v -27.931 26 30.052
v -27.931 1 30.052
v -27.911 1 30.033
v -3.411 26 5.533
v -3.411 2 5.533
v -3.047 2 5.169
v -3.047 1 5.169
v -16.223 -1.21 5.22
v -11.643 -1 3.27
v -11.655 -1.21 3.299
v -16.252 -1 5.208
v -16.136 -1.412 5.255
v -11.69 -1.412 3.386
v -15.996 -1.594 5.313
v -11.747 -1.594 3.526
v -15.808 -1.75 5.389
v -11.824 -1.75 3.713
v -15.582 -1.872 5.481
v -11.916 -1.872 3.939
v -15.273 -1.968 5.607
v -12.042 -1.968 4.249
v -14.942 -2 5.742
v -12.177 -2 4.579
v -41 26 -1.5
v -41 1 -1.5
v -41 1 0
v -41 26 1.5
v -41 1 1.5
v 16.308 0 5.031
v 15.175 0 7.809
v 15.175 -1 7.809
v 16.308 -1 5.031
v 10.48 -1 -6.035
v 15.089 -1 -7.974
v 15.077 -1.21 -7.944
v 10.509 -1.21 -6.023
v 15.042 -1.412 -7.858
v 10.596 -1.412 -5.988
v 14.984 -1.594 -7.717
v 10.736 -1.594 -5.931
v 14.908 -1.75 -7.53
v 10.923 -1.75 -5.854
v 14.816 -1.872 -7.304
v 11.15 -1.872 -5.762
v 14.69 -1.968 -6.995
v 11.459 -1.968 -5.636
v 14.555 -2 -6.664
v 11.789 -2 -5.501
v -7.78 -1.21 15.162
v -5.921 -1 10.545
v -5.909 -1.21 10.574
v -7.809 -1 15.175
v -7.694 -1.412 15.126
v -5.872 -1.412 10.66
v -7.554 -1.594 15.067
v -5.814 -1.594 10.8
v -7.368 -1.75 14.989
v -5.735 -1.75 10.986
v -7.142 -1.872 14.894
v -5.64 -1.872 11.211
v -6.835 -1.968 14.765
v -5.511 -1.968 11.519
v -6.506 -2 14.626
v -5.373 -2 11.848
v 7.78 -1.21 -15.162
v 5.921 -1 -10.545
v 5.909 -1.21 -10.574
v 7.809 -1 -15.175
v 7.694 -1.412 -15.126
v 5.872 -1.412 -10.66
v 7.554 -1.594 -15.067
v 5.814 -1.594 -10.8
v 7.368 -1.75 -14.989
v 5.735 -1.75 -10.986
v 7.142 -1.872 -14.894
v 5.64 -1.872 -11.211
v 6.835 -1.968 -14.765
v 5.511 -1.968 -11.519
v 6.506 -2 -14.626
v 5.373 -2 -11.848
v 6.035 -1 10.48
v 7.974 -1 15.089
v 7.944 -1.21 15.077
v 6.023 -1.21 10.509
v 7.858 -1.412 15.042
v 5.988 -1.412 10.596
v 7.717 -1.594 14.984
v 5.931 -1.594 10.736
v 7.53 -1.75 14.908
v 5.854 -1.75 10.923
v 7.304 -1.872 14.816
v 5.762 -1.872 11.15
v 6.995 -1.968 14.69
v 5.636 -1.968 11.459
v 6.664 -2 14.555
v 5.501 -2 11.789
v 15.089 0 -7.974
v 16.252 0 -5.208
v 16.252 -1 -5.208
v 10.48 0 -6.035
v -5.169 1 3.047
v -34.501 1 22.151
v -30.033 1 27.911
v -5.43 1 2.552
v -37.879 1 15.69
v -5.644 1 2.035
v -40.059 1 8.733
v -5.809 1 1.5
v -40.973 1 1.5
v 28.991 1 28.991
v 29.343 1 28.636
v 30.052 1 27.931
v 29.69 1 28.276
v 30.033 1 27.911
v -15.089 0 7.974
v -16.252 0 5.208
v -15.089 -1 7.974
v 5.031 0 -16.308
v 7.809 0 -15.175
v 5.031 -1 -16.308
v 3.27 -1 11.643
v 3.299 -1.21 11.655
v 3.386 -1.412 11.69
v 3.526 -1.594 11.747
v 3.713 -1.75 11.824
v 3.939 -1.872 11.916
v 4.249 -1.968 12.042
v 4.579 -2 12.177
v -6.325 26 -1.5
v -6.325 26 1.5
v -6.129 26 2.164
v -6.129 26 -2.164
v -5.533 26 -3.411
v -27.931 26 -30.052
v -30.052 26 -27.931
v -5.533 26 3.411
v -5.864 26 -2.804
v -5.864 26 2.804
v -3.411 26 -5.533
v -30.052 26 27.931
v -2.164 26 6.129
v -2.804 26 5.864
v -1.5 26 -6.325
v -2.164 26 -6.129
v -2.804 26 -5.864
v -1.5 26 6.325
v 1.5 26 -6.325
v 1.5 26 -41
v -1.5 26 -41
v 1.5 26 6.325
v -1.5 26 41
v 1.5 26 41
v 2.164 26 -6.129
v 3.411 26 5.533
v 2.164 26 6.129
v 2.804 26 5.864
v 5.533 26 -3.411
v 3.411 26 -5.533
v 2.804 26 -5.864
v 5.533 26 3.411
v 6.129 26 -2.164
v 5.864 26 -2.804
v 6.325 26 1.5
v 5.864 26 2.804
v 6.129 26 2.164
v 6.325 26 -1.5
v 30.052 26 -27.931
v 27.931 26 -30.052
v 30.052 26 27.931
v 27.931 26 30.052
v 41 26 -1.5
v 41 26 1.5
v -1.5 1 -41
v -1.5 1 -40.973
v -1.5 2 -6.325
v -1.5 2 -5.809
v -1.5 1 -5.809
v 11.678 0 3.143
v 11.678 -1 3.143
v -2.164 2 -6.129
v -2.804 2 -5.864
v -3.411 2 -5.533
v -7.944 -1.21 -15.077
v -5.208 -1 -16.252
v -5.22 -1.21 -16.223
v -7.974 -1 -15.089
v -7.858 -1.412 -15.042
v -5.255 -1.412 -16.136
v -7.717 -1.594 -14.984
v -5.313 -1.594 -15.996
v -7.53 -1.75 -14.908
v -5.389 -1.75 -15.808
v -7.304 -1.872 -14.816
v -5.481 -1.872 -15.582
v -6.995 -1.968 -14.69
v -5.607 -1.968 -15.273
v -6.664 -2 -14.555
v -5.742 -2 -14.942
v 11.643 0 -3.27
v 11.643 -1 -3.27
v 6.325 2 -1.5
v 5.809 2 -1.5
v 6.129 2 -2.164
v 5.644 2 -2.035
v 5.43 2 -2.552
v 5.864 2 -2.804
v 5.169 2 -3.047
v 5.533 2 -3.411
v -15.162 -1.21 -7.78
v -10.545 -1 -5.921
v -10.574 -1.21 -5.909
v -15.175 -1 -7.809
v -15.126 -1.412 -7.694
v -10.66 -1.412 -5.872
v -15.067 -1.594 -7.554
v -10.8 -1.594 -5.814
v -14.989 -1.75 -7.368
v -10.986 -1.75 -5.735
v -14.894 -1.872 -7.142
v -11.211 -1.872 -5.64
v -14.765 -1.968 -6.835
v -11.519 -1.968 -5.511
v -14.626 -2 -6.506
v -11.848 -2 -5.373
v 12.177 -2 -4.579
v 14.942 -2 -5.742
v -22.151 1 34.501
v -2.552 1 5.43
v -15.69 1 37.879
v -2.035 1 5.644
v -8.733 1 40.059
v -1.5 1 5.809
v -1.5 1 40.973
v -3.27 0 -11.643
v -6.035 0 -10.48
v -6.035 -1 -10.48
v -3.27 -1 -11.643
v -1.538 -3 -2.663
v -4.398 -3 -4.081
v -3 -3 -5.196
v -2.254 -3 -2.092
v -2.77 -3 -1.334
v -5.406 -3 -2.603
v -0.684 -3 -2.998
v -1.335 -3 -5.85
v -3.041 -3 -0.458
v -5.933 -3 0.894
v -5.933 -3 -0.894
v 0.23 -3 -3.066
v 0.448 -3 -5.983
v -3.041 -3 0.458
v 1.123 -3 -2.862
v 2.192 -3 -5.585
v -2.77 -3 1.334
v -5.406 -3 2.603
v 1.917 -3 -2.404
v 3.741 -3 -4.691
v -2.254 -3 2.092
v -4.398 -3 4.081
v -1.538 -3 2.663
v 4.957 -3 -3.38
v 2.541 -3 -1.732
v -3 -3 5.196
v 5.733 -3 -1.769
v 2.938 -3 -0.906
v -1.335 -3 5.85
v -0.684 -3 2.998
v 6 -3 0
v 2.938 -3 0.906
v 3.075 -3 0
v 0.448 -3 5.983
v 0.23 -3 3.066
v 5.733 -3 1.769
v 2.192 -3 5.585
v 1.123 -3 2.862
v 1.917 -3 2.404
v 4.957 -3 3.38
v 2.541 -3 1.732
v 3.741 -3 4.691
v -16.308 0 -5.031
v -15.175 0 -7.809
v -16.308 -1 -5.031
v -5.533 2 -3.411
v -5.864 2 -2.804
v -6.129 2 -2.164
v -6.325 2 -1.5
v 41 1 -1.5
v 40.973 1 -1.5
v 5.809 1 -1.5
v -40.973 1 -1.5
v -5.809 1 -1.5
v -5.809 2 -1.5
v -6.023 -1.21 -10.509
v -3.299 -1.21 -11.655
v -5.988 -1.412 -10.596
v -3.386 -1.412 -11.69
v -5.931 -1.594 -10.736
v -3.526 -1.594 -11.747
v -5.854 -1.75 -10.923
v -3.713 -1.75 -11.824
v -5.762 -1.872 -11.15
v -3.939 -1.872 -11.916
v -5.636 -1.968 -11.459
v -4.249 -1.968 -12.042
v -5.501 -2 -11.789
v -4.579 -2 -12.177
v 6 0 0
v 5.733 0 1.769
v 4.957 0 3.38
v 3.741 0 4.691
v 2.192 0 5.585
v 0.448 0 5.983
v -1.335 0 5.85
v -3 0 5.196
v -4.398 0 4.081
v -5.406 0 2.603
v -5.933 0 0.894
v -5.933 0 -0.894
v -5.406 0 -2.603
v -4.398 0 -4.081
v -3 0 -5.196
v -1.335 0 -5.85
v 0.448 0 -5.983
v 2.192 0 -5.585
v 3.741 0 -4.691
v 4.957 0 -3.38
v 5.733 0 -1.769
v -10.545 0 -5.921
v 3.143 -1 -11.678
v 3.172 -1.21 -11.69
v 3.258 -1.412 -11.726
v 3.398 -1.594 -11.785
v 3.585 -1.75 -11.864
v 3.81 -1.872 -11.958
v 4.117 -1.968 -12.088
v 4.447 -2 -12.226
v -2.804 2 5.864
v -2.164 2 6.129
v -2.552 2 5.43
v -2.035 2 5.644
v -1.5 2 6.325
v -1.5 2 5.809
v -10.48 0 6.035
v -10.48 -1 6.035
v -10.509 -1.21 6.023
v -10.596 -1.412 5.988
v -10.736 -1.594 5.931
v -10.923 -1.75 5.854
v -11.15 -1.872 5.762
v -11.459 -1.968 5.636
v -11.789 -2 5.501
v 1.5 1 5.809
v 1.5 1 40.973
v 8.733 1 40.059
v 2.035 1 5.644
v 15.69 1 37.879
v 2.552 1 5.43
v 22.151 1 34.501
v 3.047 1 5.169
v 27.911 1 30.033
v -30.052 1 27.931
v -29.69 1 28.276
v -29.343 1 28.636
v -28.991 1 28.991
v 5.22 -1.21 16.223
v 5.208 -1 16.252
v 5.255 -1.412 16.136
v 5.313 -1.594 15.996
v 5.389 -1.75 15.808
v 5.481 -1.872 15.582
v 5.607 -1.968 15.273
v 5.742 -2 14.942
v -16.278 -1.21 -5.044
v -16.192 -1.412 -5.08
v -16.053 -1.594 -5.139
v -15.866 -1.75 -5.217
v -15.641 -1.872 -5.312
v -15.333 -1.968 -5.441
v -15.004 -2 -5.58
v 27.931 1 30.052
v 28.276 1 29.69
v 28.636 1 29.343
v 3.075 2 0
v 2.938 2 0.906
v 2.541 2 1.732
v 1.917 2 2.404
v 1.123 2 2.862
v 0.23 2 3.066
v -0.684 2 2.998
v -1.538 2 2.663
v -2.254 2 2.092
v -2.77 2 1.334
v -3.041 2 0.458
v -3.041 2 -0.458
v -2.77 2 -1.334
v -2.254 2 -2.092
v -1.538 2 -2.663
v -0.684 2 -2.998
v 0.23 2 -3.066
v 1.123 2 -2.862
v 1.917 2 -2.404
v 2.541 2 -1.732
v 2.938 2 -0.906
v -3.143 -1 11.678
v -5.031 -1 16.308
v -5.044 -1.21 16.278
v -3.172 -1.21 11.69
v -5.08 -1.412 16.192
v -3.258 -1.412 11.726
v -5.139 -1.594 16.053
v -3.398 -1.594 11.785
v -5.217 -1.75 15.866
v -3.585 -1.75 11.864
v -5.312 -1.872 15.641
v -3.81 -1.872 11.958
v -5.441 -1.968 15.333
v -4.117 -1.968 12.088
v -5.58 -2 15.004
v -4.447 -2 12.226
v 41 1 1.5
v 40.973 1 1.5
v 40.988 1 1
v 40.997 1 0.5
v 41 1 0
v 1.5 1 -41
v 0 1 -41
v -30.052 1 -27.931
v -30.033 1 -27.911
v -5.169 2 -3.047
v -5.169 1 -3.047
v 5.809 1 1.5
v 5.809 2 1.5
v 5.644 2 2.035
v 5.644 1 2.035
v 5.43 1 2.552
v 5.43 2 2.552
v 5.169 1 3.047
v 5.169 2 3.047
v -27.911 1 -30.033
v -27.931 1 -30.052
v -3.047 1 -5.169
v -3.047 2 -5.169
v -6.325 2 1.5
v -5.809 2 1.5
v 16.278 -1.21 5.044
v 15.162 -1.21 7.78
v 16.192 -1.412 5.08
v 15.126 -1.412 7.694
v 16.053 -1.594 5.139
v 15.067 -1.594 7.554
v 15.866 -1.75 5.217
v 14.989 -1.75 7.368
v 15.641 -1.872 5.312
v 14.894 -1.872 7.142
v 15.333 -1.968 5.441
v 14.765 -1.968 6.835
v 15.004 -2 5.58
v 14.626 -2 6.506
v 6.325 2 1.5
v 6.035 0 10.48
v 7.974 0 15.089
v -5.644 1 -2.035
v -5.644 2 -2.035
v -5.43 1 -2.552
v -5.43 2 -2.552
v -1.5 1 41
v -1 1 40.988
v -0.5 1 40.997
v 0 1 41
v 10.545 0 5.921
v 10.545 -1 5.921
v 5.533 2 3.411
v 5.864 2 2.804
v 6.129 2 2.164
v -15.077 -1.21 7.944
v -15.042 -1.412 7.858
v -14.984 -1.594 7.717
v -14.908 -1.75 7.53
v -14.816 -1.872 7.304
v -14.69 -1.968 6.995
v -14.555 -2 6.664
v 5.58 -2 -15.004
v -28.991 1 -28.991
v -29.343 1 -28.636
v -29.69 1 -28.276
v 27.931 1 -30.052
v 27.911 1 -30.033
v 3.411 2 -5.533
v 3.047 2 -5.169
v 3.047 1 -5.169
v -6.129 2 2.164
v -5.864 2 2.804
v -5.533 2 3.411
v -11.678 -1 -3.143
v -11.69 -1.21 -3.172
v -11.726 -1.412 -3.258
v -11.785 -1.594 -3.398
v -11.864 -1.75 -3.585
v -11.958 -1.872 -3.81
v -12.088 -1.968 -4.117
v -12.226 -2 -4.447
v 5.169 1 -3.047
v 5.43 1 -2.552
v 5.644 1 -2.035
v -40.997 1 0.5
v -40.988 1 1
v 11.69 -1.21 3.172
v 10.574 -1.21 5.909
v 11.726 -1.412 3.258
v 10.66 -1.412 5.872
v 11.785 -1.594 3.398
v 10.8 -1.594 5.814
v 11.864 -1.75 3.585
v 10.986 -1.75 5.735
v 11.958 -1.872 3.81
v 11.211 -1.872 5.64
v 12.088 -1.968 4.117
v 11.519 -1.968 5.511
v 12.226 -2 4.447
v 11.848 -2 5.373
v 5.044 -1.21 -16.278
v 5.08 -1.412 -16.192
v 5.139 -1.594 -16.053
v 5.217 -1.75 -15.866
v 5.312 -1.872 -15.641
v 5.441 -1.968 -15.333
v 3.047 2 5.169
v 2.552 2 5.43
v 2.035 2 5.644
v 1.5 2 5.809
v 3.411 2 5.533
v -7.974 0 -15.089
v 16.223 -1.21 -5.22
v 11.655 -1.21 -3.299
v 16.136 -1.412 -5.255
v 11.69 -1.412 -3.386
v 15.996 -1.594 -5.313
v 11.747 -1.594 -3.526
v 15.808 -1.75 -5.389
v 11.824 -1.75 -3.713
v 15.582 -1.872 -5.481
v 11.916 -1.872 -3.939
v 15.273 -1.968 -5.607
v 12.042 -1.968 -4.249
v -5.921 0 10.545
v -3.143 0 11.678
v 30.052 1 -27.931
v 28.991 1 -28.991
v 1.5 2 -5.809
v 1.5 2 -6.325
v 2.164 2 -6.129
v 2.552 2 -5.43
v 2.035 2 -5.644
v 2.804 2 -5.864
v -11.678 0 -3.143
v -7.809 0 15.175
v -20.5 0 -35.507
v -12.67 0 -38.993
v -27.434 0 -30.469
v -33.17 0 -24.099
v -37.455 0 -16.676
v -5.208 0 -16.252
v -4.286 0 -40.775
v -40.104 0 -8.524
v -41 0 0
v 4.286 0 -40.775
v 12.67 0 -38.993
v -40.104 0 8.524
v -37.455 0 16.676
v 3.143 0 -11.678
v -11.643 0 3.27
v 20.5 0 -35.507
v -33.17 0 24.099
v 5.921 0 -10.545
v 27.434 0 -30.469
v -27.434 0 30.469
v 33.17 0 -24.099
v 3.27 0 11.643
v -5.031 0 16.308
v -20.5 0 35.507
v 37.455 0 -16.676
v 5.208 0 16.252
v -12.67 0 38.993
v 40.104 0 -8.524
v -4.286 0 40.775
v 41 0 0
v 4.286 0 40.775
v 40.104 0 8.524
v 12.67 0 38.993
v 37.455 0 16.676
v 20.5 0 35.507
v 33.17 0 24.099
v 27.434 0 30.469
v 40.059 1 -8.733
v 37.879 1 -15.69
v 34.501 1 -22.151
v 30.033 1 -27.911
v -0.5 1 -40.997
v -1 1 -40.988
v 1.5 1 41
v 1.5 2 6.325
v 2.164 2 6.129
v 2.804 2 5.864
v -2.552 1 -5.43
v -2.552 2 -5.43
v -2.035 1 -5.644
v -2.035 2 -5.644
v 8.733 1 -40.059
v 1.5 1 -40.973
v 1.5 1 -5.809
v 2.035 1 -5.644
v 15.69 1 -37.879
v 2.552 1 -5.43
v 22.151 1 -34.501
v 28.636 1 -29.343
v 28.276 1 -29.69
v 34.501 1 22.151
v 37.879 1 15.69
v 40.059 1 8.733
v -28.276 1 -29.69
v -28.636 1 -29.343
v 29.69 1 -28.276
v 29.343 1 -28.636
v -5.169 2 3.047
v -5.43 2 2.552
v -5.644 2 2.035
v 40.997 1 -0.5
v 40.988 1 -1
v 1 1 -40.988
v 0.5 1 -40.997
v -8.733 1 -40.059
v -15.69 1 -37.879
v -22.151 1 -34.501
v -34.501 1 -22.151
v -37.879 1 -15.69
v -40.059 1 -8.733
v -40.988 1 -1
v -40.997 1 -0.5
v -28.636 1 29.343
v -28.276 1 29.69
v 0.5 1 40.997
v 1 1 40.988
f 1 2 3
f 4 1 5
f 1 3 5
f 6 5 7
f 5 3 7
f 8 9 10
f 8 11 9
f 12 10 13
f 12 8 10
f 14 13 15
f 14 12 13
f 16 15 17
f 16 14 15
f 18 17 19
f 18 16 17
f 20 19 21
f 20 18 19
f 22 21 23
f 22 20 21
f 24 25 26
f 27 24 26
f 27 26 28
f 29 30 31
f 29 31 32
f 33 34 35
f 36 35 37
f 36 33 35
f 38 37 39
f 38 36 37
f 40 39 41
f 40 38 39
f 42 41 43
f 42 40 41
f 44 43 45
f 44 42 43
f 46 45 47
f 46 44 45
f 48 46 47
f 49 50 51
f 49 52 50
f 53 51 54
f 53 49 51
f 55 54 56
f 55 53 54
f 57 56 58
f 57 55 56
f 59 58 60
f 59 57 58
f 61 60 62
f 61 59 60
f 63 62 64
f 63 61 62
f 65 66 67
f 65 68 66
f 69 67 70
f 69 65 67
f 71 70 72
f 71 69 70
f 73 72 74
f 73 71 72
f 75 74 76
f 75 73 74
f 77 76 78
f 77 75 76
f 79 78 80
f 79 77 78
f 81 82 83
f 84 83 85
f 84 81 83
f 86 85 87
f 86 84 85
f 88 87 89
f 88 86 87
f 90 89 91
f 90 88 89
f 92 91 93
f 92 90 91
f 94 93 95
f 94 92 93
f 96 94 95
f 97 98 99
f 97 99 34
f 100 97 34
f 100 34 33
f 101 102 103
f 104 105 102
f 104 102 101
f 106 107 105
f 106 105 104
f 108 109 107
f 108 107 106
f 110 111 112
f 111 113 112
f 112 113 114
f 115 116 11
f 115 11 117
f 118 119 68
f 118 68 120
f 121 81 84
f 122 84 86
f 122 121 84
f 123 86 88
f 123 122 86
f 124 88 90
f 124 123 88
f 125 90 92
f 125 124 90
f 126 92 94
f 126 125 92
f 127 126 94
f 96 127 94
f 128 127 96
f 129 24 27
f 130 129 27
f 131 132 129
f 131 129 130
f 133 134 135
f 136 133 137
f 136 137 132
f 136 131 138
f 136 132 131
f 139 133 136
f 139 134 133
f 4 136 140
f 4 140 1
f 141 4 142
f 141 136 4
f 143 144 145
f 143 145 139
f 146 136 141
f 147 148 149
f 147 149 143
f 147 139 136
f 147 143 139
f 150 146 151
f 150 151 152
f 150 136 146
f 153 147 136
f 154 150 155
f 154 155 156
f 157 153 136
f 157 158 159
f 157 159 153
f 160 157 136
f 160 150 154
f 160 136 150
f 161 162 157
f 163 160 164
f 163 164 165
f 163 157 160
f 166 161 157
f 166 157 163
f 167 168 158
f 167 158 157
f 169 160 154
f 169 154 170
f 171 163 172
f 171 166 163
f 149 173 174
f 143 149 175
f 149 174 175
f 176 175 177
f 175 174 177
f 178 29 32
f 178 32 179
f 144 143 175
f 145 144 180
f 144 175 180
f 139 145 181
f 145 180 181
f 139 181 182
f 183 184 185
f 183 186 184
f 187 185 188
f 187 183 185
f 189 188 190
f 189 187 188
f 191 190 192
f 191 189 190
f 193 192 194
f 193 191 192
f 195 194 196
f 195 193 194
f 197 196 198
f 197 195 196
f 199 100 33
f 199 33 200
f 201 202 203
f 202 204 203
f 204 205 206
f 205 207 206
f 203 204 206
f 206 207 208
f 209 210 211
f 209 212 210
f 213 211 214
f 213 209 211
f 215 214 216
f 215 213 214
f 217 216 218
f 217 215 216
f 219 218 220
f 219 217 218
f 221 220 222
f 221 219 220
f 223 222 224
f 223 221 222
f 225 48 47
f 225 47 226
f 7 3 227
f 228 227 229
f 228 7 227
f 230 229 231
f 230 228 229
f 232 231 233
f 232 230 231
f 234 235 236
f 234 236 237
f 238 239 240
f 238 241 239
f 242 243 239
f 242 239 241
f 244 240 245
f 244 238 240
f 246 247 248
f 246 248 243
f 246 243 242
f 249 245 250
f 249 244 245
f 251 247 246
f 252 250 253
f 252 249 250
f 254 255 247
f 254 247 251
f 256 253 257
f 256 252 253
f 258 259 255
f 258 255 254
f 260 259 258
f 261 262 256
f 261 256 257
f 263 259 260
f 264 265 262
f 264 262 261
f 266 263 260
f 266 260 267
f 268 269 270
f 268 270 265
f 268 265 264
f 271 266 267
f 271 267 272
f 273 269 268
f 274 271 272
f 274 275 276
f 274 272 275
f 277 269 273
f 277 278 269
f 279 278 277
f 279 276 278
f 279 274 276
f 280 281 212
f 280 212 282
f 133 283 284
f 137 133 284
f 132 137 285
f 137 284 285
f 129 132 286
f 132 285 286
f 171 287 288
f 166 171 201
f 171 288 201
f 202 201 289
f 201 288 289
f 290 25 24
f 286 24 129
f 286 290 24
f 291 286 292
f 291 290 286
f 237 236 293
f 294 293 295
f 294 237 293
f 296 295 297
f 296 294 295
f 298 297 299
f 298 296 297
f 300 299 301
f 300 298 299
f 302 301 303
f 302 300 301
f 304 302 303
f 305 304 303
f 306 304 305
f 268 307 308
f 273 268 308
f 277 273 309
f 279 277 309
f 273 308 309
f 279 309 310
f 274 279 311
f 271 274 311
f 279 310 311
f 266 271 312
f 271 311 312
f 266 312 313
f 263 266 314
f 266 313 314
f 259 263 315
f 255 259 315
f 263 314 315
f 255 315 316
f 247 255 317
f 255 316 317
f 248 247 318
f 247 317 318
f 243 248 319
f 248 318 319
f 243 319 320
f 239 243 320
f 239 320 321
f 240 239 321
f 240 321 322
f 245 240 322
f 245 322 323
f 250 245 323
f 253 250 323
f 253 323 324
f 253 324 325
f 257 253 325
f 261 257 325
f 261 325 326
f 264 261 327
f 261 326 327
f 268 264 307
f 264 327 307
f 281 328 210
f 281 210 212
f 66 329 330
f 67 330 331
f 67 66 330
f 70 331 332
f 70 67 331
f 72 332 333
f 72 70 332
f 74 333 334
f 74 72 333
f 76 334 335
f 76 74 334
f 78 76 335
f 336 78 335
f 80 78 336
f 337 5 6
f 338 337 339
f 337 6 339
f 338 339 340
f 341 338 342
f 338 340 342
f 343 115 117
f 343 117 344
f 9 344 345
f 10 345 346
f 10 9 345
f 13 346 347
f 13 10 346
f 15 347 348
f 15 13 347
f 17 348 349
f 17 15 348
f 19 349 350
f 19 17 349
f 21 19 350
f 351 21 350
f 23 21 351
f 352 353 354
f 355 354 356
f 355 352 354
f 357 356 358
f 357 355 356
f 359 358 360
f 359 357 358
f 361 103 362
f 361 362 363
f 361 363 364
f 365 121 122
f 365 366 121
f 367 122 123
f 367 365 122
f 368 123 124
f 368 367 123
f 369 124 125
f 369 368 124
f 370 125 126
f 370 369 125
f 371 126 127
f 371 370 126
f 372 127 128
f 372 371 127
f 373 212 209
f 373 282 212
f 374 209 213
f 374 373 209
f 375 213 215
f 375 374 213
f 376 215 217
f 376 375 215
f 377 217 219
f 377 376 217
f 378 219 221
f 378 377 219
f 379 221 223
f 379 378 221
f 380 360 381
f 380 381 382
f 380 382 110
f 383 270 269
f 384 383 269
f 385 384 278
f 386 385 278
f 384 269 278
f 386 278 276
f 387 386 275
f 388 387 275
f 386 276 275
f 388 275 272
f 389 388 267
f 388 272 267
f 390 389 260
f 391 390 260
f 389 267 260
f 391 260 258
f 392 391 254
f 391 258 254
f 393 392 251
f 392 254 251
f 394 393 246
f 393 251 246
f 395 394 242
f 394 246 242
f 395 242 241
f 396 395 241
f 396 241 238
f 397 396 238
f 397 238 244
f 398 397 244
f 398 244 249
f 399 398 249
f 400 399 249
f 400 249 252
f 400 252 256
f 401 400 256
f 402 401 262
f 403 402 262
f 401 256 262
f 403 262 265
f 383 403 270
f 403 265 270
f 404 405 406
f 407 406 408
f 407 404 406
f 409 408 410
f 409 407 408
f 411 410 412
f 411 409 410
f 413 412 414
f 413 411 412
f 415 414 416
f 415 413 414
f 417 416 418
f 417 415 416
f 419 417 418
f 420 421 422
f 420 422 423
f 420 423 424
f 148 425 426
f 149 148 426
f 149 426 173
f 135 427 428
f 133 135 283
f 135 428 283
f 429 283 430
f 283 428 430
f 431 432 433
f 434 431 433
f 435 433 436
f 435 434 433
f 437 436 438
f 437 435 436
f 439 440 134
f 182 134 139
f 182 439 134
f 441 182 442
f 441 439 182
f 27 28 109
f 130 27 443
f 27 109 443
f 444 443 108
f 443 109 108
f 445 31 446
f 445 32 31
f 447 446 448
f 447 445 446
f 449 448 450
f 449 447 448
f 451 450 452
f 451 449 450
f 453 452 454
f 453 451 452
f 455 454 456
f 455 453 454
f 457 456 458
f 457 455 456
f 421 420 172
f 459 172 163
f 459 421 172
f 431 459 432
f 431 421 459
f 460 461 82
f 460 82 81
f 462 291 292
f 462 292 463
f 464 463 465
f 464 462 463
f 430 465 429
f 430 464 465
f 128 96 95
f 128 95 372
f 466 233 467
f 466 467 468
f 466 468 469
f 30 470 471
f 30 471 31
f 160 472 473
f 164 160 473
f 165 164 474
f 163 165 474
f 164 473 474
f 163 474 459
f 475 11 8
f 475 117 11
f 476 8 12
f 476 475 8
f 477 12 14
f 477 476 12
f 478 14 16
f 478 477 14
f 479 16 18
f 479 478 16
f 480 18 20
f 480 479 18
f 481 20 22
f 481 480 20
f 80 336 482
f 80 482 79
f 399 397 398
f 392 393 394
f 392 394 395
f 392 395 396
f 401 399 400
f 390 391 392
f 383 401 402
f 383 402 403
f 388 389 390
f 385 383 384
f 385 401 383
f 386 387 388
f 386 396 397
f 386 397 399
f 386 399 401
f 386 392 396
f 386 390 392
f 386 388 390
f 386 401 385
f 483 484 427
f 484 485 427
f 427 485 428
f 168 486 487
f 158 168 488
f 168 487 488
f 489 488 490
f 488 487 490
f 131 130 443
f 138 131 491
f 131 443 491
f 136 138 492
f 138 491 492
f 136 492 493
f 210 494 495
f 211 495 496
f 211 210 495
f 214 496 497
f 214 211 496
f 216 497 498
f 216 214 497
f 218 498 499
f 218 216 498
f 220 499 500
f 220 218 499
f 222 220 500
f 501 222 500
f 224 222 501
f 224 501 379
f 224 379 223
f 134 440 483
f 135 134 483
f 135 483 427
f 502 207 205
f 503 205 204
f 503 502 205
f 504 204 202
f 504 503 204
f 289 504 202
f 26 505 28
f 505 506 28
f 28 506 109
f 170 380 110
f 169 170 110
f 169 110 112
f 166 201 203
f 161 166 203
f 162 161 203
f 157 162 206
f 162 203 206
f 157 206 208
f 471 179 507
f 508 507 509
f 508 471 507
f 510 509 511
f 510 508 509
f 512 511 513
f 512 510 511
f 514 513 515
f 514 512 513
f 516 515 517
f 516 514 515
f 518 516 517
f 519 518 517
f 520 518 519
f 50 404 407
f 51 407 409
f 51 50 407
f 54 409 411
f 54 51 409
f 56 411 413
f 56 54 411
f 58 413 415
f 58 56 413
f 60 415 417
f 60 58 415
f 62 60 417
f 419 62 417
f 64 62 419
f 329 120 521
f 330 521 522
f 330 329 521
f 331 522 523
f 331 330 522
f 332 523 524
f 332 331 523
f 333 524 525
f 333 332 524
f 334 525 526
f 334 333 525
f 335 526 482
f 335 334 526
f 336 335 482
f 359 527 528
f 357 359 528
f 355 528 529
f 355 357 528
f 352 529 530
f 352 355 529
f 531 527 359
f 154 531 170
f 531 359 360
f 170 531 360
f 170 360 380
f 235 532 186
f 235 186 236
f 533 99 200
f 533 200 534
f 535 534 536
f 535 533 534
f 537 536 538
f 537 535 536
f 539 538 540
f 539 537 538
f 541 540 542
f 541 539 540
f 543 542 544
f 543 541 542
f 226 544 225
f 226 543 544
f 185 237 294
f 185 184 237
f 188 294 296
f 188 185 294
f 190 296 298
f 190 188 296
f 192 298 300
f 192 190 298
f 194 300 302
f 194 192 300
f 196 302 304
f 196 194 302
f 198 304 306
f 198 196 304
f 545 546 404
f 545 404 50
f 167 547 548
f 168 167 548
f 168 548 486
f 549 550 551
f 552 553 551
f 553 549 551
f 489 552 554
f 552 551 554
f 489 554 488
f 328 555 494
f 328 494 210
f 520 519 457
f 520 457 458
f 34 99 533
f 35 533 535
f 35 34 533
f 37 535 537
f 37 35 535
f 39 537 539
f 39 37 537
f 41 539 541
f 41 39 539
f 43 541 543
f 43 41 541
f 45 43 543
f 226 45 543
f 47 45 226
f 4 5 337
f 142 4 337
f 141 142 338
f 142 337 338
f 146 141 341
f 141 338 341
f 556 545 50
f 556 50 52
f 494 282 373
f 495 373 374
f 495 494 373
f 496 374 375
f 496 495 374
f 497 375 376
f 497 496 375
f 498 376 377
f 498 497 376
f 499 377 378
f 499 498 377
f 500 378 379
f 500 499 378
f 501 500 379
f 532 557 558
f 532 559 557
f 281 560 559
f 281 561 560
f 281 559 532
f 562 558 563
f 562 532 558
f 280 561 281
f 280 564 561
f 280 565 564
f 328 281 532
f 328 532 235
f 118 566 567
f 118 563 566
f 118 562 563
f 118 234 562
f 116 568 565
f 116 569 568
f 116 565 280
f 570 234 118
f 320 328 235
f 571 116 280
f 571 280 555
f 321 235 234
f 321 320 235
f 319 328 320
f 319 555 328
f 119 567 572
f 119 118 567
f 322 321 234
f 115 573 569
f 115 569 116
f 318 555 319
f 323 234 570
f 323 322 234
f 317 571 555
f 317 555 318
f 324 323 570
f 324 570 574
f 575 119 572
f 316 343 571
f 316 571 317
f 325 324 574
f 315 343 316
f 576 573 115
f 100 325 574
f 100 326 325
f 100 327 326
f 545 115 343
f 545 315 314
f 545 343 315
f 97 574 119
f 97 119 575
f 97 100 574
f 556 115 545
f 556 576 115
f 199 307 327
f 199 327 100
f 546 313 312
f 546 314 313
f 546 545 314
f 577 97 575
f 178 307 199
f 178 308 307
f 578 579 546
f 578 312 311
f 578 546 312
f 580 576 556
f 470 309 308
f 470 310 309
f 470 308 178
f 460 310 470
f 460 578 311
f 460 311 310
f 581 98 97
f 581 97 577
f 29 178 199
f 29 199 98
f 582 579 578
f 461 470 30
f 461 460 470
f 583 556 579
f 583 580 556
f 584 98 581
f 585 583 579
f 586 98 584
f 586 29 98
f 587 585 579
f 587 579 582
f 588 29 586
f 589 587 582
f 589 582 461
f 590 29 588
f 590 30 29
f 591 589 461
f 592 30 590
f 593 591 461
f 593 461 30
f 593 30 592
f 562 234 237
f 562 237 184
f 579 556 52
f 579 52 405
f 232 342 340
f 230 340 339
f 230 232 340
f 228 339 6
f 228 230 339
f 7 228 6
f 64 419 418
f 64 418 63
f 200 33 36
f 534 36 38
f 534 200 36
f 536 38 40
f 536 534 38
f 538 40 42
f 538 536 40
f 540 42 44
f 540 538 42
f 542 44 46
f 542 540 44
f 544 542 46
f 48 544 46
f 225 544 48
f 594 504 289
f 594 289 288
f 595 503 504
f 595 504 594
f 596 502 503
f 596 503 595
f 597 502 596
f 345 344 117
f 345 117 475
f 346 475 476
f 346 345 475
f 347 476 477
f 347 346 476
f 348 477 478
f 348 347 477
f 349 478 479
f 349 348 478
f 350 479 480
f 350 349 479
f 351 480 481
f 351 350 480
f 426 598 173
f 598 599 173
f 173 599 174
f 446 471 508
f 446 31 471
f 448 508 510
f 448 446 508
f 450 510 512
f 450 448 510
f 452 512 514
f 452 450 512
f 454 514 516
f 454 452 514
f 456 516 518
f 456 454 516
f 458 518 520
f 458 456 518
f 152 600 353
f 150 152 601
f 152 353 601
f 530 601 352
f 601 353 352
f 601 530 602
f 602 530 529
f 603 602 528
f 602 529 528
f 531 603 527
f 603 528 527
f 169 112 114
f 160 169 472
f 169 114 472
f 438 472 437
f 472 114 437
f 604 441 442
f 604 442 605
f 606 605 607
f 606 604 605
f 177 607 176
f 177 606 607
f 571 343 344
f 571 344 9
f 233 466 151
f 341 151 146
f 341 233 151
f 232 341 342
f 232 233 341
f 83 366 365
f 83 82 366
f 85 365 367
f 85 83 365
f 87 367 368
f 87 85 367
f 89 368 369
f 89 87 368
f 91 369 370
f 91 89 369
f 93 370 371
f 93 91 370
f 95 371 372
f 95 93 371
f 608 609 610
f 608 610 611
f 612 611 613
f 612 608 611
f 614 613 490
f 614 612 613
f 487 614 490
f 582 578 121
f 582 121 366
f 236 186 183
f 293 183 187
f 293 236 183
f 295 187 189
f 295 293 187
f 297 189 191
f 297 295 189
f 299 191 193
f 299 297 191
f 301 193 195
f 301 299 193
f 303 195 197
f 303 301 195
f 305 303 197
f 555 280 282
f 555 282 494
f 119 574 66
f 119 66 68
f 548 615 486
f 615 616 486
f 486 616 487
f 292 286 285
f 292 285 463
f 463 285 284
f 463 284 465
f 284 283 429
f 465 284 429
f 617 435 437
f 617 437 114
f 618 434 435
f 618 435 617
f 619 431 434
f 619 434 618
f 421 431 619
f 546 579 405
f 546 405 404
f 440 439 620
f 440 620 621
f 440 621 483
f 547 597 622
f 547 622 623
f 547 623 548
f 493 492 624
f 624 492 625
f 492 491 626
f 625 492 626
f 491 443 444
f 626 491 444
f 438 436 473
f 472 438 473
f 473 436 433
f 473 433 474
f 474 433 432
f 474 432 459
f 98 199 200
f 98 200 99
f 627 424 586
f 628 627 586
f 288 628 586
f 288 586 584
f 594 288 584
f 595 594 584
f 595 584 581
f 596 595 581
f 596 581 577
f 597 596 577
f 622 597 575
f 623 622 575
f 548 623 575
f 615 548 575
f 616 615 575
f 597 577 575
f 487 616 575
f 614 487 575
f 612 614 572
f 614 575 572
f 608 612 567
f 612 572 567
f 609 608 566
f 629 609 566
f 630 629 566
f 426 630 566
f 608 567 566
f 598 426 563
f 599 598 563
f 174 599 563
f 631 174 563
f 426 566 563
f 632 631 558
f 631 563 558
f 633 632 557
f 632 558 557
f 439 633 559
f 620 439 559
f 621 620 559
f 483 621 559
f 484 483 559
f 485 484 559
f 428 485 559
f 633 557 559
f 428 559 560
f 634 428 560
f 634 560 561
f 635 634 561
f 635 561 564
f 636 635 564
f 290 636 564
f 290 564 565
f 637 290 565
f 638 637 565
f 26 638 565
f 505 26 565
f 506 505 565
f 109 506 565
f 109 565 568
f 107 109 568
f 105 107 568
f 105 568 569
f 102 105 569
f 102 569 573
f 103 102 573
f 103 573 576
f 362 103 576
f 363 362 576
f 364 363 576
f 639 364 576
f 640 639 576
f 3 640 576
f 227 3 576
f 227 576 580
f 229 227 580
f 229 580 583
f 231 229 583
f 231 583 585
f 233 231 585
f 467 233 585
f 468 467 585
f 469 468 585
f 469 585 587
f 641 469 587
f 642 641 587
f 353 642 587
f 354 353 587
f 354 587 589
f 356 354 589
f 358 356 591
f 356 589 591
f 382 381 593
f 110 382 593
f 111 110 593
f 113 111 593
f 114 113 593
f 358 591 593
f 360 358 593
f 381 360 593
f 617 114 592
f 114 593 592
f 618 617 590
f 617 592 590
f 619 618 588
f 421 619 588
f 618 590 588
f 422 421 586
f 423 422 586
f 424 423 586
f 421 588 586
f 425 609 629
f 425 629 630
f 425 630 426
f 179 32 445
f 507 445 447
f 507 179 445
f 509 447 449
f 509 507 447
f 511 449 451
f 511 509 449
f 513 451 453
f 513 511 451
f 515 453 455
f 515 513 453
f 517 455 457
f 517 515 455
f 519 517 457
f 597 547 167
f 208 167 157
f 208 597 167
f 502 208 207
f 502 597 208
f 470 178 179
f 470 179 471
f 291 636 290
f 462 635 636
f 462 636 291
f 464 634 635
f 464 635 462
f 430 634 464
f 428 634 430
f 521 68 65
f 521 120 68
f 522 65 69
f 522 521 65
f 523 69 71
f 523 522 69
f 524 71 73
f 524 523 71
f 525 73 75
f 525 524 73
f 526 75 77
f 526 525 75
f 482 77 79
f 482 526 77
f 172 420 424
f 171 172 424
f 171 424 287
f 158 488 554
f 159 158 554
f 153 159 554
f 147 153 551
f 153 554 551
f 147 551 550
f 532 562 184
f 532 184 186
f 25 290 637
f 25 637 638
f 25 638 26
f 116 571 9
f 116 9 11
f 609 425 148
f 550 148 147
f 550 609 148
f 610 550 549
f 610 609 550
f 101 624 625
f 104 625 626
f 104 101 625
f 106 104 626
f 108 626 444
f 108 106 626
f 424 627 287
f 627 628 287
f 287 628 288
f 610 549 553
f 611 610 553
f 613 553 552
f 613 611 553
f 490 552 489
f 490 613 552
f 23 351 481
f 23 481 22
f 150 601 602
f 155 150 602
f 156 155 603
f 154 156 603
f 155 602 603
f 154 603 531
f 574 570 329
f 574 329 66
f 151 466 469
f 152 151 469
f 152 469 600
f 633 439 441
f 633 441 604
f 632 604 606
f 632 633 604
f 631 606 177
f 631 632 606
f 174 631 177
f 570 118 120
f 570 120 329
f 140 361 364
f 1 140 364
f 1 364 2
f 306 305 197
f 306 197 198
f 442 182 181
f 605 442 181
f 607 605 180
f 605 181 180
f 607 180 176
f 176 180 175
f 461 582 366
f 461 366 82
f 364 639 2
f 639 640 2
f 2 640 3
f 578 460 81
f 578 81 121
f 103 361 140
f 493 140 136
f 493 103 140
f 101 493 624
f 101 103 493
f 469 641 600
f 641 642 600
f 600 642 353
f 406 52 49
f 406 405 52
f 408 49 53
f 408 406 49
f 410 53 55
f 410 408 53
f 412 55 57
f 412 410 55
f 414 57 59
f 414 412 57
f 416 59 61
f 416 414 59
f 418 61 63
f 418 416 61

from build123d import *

# Parameters (mm, degrees)
SKETCH1_R            = 41
BOSS_EXTRUDE1_DEPTH  = 1
SKETCH6_W            = 3
SKETCH6_H            = 41
BOSS_EXTRUDE7_DEPTH  = 25
SKETCH7_R            = 6
BOSS_EXTRUDE8_DEPTH  = 24
SKETCH9_R            = 6
CUT_EXTRUDE3_DEPTH   = 5
CIRPATTERN1_COUNT    = 8
SKETCH11_R           = 6
CUT_EXTRUDE5_DEPTH   = 6
BOSS_EXTRUDE9_DEPTH  = 2
CIRPATTERN2_COUNT    = 8
FILLET1_R            = 1
SKETCH13_R           = 6.5
BOSS_EXTRUDE17_DEPTH = 6
SKETCH16_R           = 6.5
SKETCH16_R_2         = 6
BOSS_EXTRUDE18_DEPTH = 24
SKETCH15_R           = 6
BOSS_EXTRUDE19_DEPTH = 3
SKETCH17_R           = 3.075
CUT_EXTRUDE10_DEPTH  = 5


with BuildPart() as part:
    # Sketch1 → Boss-Extrude1 (new body)
    with BuildSketch(Plane(origin=(0, 0, 0), x_dir=(1, 0, 0), z_dir=(0, 1, 0))):
        Circle(SKETCH1_R)
    extrude(amount=BOSS_EXTRUDE1_DEPTH)

    # Sketch6 → Boss-Extrude7 (add)
    with BuildSketch(Plane(origin=(0, 1, 0), x_dir=(1, 0, 0), z_dir=(0, 1, 0))):
        with Locations((0, -20.5)):
            Rectangle(SKETCH6_W, SKETCH6_H)
    boss_extrude7 = extrude(amount=BOSS_EXTRUDE7_DEPTH)

    # Sketch7 → Boss-Extrude8 (add)
    with BuildSketch(Plane.XZ):
        Circle(SKETCH7_R)
    extrude(amount=-BOSS_EXTRUDE8_DEPTH)

    # Sketch9 → Cut-Extrude3 (cut)
    with BuildSketch(Plane(origin=(0, 26, 0), x_dir=(1, 0, 0), z_dir=(0, 1, 0))):
        Circle(SKETCH9_R)
    extrude(amount=-CUT_EXTRUDE3_DEPTH, mode=Mode.SUBTRACT)

    # CirPattern1: Boss-Extrude7 ×8 about axis
    cirpattern1_axis = Axis((0, 0, 0), (0, 1, 0))
    for i in range(1, CIRPATTERN1_COUNT):
        add(boss_extrude7.rotate(cirpattern1_axis, i * 360 / CIRPATTERN1_COUNT))

    # Sketch11 → Cut-Extrude5 (cut)
    with BuildSketch(Plane(origin=(0, 26, 0), x_dir=(1, 0, 0), z_dir=(0, 1, 0))):
        Circle(SKETCH11_R)
    extrude(amount=-CUT_EXTRUDE5_DEPTH, mode=Mode.SUBTRACT)

    # Sketch10 → Boss-Extrude9 (add)
    with BuildSketch(Plane(origin=(0, 0, 0), x_dir=(-1, 0, 0), z_dir=(0, -1, 0))):
        Polygon((-3.142992858, 11.677824964), (-5.920826915, 10.544847493), (-7.809122701, 15.174570921), (-5.031288644, 16.307548393), align=None)
    boss_extrude9 = extrude(amount=BOSS_EXTRUDE9_DEPTH)

    # CirPattern2: Boss-Extrude9 ×8 about axis
    cirpattern2_axis = Axis((0, 0, 0), (0, 1, 0))
    for i in range(1, CIRPATTERN2_COUNT):
        add(boss_extrude9.rotate(cirpattern2_axis, i * 360 / CIRPATTERN2_COUNT))

    # Fillet1
    fillet1_edges = [part.edges().sort_by_distance(p)[0] for p in [
        (4.087140751, -2, -13.992686678),
        (6.420205673, -2, -15.741059657),
        (6.864974808, -2, -12.859709207),
        (4.531909887, -2, -11.111336228),
        (-7.004278697, -2, -12.784368578),
        (-6.590839059, -2, -15.670380994),
        (-4.238917345, -2, -13.947457824),
        (-4.652356983, -2, -11.061445408),
        (-13.992686678, -2, -4.087140751),
        (-15.741059657, -2, -6.420205673),
        (-12.859709207, -2, -6.864974808),
        (-11.111336228, -2, -4.531909887),
        (-12.784368578, -2, 7.004278697),
        (-15.670380994, -2, 6.590839059),
        (-13.947457824, -2, 4.238917345),
        (-11.061445408, -2, 4.652356983),
        (-4.087140751, -2, 13.992686678),
        (-6.420205673, -2, 15.741059657),
        (-6.864974808, -2, 12.859709207),
        (-4.531909887, -2, 11.111336228),
        (7.004278697, -2, 12.784368578),
        (6.590839059, -2, 15.670380994),
        (4.238917345, -2, 13.947457824),
        (4.652356983, -2, 11.061445408),
        (13.992686678, -2, 4.087140751),
        (15.741059657, -2, 6.420205673),
        (12.859709207, -2, 6.864974808),
        (11.111336228, -2, 4.531909887),
        (12.784368578, -2, -7.004278697),
        (15.670380994, -2, -6.590839059),
        (13.947457824, -2, -4.238917345),
        (11.061445408, -2, -4.652356983),
    ]]
    fillet(fillet1_edges, radius=FILLET1_R)

    # Sketch13 → Boss-Extrude17 (add)
    with BuildSketch(Plane(origin=(0, 20, 0), x_dir=(1, 0, 0), z_dir=(0, 1, 0))):
        Circle(SKETCH13_R)
    extrude(amount=BOSS_EXTRUDE17_DEPTH)

    # Sketch16 → Boss-Extrude18 (add)
    with BuildSketch(Plane(origin=(0, 26, 0), x_dir=(1, 0, 0), z_dir=(0, 1, 0))):
        Circle(SKETCH16_R)
        Circle(SKETCH16_R_2, mode=Mode.SUBTRACT)
    extrude(amount=-BOSS_EXTRUDE18_DEPTH)

    # Sketch15 → Boss-Extrude19 (add)
    with BuildSketch(Plane.XZ):
        Circle(SKETCH15_R)
    extrude(amount=BOSS_EXTRUDE19_DEPTH)

    # Sketch17 → Cut-Extrude10 (cut)
    with BuildSketch(Plane.XZ.offset(3)):
        Circle(SKETCH17_R)
    extrude(amount=-CUT_EXTRUDE10_DEPTH, mode=Mode.SUBTRACT)


solid = part.part
